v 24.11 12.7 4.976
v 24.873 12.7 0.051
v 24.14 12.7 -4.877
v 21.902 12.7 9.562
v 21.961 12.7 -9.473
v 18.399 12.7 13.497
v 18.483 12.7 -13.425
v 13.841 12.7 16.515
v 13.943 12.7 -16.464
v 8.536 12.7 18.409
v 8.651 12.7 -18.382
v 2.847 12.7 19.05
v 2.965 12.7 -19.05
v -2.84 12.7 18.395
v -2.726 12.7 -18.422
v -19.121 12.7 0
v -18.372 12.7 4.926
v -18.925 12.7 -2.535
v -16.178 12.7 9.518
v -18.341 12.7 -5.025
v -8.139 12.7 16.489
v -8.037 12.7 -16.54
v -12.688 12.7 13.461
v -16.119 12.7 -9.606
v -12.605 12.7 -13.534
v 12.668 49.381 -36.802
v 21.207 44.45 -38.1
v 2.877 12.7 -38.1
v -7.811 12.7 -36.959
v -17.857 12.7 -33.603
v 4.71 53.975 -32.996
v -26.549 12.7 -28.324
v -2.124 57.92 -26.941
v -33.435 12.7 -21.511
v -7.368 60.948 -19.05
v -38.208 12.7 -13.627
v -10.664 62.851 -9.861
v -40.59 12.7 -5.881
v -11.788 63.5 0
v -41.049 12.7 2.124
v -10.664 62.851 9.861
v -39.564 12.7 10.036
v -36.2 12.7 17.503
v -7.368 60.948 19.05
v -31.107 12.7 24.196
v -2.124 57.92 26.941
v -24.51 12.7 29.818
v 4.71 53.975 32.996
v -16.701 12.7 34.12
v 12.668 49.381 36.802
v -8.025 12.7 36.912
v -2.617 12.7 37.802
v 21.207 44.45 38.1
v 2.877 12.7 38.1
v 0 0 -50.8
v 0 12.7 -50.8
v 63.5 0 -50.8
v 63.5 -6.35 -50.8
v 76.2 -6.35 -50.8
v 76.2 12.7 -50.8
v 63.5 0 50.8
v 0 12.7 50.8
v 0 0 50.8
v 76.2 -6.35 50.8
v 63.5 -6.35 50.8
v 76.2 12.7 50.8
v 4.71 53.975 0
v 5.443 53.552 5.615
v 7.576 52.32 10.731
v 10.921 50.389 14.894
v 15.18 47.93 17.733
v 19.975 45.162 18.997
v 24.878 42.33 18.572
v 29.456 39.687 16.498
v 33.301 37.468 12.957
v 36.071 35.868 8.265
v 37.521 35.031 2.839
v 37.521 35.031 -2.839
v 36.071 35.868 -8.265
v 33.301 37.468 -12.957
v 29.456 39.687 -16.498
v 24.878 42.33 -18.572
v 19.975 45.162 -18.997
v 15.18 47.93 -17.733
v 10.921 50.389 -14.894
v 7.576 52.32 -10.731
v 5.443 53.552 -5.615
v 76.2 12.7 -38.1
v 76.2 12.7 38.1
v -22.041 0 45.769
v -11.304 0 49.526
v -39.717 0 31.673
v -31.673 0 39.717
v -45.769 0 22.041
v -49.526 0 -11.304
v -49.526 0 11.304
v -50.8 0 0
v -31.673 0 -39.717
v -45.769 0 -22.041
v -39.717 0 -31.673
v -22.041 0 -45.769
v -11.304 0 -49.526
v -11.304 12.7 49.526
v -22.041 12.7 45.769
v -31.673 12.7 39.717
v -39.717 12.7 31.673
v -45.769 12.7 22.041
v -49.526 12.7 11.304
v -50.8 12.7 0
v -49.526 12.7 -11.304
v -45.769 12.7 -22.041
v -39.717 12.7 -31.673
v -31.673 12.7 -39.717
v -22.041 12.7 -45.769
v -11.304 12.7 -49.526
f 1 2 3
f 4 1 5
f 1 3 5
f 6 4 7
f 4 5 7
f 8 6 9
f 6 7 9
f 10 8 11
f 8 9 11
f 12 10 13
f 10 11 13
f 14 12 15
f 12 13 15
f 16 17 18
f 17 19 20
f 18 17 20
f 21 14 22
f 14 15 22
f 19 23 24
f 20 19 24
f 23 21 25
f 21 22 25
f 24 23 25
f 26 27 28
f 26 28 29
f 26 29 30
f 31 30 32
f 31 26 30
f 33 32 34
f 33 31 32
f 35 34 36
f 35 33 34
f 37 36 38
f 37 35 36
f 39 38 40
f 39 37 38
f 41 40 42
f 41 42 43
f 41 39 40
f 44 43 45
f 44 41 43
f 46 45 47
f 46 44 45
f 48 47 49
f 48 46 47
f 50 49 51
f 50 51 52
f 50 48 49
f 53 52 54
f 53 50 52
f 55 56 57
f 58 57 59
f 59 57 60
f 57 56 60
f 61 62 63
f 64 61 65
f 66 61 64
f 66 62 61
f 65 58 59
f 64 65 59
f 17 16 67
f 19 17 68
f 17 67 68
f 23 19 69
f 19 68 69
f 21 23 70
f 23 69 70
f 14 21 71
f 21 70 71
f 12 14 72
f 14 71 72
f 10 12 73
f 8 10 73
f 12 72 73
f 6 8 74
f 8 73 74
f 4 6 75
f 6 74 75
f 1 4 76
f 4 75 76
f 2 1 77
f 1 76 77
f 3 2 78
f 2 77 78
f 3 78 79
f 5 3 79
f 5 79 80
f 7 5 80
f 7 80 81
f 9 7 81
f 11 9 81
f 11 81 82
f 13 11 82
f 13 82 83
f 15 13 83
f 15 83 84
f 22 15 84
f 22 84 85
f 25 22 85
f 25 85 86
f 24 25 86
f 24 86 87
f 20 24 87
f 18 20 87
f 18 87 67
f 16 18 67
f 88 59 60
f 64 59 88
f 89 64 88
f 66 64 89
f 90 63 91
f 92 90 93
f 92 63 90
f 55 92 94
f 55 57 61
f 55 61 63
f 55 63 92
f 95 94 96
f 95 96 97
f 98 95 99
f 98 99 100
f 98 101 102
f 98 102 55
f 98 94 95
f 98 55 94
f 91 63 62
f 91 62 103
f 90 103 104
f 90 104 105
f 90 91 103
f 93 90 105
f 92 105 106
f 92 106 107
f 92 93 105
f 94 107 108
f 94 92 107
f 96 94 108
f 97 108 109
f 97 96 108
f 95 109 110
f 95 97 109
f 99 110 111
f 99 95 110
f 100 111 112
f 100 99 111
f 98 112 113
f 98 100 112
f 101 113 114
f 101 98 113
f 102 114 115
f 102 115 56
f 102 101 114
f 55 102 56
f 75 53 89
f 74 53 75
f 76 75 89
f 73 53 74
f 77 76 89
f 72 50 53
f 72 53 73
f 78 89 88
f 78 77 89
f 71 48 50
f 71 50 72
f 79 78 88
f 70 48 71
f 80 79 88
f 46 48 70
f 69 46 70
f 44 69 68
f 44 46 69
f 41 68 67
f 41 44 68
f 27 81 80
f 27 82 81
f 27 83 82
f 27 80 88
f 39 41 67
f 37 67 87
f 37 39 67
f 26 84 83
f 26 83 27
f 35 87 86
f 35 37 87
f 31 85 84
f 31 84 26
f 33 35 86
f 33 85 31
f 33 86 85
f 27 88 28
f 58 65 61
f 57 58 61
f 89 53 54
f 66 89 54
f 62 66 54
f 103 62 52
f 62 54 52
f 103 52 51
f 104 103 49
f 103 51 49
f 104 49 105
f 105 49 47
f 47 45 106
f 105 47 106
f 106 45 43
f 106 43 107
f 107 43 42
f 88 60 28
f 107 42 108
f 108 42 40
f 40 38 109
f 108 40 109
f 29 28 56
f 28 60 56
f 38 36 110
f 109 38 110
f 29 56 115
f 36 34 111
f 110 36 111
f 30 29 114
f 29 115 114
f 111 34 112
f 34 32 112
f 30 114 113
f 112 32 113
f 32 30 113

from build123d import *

# Parameters (mm, degrees)
BOSS_EXTRUDE1_DEPTH = 12.7
SKETCH2_W           = 12.7
SKETCH2_H           = 6.35
BOSS_EXTRUDE2_DEPTH = 101.6
BOSS_EXTRUDE3_REACH = 105.182
SKETCH3_R           = 19.05


with BuildPart() as part:
    # Sketch1 → Boss-Extrude1 (new body)
    with BuildSketch(Plane(origin=(0, 0, 0), x_dir=(1, 0, 0), z_dir=(0, 1, 0))):
        with BuildLine():
            Line((0, 50.8), (76.2, 50.8))
            Line((76.2, 50.8), (76.2, -50.8))
            Line((76.2, -50.8), (0, -50.8))
            ThreePointArc((0, -50.8), (-50.8, 0), (0, 50.8))
        make_face()
    extrude(amount=BOSS_EXTRUDE1_DEPTH)

    # Sketch2 → Boss-Extrude2 (add)
    with BuildSketch(Plane.XY.offset(50.8)):
        with Locations((69.85, -3.175)):
            Rectangle(SKETCH2_W, SKETCH2_H)
    extrude(amount=-BOSS_EXTRUDE2_DEPTH)

    # Boss-Extrude3: up to this face of the body (flat: up to its plane)
    boss_extrude3_end = Plane(part.part.faces().sort_by_distance((17.597225425, 12.7, 0))[0])
    # Sketch3 → Boss-Extrude3 (add, up to the picked face)
    with BuildSketch(Plane(origin=(24.549261314, 42.520567884, 0), x_dir=(0, 0, -1), z_dir=(0.500000000000001, 0.866025403784438, 0)), mode=Mode.PRIVATE) as boss_extrude3_sk1:
        with BuildLine():
            Line((-38.1, 3.858864232), (-38.1, -59.641135768))
            Line((-38.1, -59.641135768), (38.1, -59.641135768))
            Line((38.1, -59.641135768), (38.1, 3.858864232))
            ThreePointArc((38.1, 3.858864232), (0, 41.958864232), (-38.1, 3.858864232))
        make_face()
        with Locations((0, 3.858864232)):
            Circle(SKETCH3_R, mode=Mode.SUBTRACT)
    boss_extrude3_tool1 = split(extrude(boss_extrude3_sk1.sketch, amount=-BOSS_EXTRUDE3_REACH, mode=Mode.PRIVATE), bisect_by=boss_extrude3_end, keep=Keep.BOTH, mode=Mode.PRIVATE)
    add(boss_extrude3_tool1.solids().sort_by(Axis((38.119708, 34.685667, 0), (-0.500000000000001, -0.866025403784438, 0)))[0])


solid = part.part
